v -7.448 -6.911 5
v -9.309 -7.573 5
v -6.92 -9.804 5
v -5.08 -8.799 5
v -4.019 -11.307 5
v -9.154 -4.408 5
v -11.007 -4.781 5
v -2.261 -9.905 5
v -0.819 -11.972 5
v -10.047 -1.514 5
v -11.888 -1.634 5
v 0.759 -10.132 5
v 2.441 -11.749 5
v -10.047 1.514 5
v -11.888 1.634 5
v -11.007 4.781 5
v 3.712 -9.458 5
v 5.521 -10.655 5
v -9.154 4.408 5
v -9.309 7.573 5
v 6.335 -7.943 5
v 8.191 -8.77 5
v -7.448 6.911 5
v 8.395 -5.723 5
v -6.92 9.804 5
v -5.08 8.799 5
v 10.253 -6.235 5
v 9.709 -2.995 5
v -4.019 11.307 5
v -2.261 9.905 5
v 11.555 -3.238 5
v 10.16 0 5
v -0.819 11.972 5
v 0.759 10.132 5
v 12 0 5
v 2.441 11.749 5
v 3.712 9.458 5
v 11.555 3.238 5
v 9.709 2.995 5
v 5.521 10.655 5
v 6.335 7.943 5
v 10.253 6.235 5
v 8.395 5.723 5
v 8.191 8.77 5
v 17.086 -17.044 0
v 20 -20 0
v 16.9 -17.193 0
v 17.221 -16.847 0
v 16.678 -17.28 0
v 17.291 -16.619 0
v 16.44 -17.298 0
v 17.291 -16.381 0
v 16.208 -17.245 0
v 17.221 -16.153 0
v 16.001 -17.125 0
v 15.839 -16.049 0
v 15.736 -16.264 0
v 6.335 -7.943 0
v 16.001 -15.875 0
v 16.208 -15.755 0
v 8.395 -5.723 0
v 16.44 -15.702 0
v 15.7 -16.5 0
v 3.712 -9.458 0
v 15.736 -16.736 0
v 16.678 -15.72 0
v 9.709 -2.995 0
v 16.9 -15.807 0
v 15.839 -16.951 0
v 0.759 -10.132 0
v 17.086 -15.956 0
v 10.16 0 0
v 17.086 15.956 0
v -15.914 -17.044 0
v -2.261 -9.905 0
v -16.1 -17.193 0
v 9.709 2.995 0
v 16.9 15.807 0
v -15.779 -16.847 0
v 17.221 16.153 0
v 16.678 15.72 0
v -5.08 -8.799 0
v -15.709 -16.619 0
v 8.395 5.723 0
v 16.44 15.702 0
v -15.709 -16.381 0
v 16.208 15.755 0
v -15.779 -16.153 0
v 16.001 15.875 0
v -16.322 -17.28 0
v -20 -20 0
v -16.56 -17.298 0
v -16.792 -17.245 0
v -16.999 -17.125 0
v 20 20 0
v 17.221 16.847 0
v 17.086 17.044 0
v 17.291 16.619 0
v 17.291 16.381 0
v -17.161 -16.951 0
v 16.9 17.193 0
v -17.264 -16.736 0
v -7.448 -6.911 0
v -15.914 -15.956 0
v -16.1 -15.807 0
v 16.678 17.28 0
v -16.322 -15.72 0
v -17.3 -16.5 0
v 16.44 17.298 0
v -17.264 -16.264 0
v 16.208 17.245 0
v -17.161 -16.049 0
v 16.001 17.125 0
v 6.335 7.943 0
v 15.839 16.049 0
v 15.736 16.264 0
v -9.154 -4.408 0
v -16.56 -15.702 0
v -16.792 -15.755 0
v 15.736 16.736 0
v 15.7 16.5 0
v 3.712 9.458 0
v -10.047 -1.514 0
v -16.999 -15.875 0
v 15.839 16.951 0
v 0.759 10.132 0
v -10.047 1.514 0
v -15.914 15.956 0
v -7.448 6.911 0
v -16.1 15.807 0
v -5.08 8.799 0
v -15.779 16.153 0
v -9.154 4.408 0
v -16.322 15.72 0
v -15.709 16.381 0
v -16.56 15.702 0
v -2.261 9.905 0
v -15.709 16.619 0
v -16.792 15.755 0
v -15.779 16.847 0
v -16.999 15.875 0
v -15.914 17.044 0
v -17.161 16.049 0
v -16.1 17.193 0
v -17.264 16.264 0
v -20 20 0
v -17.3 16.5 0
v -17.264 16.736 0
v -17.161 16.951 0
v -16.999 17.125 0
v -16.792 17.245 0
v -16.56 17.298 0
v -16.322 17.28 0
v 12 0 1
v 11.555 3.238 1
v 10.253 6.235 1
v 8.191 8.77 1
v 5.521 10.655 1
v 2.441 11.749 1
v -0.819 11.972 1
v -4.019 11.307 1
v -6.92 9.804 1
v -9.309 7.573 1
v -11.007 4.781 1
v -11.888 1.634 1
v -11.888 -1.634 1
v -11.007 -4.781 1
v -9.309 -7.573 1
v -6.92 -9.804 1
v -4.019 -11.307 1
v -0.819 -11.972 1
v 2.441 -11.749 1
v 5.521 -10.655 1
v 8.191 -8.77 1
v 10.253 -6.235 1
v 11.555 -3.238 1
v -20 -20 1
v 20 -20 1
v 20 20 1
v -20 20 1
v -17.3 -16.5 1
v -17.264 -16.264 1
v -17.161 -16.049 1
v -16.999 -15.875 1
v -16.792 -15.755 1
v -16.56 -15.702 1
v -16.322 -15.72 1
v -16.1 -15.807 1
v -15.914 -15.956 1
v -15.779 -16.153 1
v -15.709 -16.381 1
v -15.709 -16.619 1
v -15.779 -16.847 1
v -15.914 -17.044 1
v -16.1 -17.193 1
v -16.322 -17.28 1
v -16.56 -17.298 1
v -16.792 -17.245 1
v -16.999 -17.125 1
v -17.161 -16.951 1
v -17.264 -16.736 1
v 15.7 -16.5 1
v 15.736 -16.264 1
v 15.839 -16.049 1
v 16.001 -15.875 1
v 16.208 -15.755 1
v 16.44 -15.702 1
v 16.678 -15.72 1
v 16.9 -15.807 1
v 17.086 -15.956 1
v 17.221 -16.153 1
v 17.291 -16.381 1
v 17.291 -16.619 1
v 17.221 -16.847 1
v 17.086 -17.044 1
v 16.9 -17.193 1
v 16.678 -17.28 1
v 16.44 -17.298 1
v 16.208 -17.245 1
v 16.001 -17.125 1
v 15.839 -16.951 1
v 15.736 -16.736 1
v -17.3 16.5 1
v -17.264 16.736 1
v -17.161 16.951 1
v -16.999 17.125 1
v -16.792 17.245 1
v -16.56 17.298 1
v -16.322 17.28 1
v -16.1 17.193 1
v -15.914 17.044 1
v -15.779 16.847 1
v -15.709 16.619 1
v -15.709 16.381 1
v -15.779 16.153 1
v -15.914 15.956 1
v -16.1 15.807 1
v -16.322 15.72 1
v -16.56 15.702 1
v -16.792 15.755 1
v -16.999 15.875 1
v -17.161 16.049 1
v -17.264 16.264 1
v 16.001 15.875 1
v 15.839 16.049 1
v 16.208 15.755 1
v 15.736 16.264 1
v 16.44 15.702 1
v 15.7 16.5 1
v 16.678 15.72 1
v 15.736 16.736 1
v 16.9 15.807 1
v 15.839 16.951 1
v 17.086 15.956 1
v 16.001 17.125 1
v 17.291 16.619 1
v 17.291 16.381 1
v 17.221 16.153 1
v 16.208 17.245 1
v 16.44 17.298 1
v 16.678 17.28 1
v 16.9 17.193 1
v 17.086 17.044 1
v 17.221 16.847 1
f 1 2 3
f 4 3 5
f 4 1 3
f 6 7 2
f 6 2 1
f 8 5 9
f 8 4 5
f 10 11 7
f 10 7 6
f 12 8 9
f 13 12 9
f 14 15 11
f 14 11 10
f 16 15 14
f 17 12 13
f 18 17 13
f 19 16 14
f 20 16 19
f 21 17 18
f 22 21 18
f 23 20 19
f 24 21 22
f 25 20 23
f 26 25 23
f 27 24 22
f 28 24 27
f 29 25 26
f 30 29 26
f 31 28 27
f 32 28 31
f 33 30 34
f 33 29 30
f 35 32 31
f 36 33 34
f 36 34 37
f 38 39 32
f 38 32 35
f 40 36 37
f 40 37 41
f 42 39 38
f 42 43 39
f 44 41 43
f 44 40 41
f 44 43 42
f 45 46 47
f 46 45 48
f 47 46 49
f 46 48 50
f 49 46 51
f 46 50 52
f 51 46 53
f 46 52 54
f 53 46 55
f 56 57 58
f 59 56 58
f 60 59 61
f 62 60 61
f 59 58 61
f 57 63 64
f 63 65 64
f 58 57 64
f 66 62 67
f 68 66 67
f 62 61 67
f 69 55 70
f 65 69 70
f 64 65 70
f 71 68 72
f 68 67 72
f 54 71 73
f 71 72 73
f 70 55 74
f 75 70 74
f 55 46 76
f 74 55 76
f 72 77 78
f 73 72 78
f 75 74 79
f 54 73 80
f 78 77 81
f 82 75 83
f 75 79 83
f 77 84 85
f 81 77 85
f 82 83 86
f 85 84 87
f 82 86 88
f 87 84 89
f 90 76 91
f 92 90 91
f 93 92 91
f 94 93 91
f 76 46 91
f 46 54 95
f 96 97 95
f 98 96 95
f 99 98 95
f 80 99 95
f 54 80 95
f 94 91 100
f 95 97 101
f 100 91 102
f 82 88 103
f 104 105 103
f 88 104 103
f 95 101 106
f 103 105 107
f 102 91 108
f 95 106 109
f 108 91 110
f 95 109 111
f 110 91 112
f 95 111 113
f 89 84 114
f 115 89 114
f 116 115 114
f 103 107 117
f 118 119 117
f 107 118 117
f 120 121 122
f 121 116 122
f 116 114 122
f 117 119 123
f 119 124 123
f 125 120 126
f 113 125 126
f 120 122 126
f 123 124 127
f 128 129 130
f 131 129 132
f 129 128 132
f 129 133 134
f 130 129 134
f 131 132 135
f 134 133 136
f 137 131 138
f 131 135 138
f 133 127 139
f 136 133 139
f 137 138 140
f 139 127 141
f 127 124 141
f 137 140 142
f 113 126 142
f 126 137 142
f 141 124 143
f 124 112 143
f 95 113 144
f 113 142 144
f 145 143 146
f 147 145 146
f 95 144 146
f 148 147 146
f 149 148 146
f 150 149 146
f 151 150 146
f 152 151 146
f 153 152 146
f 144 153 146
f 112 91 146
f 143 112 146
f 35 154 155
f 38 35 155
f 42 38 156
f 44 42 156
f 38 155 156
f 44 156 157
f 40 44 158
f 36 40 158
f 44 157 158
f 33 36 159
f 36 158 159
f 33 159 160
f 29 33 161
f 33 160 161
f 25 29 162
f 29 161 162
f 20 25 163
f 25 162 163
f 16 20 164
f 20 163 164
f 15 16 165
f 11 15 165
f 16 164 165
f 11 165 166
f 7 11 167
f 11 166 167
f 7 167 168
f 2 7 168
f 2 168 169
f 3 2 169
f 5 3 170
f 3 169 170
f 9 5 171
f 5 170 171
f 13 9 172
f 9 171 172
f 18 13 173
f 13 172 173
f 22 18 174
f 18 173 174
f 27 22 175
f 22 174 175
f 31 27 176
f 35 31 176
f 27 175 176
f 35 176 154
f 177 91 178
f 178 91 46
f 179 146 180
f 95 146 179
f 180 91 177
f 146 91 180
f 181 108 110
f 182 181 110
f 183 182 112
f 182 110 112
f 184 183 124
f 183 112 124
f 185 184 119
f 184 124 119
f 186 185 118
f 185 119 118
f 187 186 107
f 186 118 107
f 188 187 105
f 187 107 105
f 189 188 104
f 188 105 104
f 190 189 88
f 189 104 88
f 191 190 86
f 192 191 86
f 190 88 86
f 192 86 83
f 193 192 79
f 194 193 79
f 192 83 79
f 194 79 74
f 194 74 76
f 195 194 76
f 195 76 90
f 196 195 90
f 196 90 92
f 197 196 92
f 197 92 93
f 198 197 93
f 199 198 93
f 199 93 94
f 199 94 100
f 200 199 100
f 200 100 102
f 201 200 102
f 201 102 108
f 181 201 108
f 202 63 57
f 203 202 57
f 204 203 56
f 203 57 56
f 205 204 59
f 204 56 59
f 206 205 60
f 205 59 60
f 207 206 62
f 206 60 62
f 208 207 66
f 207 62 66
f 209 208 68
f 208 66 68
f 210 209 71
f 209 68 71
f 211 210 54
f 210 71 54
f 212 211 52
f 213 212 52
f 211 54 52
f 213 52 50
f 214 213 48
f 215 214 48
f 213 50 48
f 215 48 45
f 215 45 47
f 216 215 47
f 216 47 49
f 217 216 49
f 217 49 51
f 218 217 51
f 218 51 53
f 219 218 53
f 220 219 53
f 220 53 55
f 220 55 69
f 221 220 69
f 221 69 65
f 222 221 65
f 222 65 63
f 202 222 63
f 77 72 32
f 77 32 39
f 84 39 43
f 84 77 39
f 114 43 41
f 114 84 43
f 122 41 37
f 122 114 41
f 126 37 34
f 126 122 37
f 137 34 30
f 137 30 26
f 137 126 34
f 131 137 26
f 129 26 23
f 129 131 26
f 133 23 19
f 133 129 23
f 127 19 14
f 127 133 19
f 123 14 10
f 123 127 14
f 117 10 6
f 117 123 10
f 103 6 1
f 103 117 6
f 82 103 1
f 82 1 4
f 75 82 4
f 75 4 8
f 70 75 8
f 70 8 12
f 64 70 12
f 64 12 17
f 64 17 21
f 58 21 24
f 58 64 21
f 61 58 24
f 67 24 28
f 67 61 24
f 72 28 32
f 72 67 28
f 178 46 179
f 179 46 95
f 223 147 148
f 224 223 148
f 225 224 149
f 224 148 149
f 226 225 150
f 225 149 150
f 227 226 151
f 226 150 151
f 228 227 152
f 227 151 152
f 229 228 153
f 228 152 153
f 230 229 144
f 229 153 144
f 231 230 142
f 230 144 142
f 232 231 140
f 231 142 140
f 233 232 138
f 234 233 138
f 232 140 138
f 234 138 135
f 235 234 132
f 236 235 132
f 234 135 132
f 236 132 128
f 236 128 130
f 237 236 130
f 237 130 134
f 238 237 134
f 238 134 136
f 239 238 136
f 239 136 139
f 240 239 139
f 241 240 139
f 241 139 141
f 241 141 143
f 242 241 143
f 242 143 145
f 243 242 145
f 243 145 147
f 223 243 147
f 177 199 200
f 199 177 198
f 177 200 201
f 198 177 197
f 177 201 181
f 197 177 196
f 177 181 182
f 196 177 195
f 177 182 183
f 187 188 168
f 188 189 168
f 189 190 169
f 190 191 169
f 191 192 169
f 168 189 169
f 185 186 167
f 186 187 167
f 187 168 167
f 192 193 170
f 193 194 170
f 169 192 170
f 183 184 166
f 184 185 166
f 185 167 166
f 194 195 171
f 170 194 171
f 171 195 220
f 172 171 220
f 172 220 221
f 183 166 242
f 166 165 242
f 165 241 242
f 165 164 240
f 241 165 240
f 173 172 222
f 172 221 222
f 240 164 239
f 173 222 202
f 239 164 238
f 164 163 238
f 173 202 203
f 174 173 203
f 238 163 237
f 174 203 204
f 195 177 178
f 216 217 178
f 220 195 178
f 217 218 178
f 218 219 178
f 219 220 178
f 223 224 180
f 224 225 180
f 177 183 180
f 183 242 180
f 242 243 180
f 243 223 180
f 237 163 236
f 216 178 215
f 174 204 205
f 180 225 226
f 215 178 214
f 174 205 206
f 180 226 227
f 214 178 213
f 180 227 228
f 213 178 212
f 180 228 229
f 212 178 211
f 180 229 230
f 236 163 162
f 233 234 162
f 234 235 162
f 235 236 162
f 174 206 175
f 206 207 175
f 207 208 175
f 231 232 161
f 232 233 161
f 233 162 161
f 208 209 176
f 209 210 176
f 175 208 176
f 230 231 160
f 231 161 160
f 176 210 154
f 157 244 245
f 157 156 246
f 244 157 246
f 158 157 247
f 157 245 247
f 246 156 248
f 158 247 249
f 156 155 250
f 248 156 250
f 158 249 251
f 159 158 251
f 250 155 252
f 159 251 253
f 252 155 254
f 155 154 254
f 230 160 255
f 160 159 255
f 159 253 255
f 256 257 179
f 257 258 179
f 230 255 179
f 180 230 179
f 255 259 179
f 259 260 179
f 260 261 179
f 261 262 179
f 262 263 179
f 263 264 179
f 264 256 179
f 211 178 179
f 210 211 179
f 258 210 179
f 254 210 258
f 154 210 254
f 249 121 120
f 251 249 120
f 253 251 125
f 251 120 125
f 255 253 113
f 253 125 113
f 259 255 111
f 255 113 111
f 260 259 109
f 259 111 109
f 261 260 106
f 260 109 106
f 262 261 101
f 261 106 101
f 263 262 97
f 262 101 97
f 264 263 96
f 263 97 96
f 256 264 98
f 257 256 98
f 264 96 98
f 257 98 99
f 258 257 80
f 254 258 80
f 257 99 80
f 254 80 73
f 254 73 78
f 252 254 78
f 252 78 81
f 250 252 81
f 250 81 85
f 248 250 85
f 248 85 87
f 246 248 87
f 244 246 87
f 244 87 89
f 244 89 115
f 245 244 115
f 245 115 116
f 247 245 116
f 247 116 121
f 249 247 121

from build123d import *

# Parameters (mm, degrees)
SKETCH1_R             = 14
SKETCH1_R_2           = 10.16
BOSS_EXTRUDE1_DEPTH   = 5
SKETCH1_3_W           = 40
SKETCH1_3_H           = 40
SKETCH1_3_R           = 14
BOSS_EXTRUDE2_DEPTH   = 1
CUT_EXTRUDE1_START    = -4
SKETCH2_R             = 14
SKETCH2_R_2           = 12
CUT_EXTRUDE1_DEPTH    = 4
SKETCH3_W             = 1
SKETCH3_H             = 40
BOSS_EXTRUDE3_DEPTH   = 50
BOSS_EXTRUDE5_DEPTH   = 50
SKETCH5_W             = 40
SKETCH5_H             = 50
CUT_EXTRUDE2_DEPTH    = 22
M2_TAPPED_HOLE2_D     = 1.6
M2_TAPPED_HOLE2_DEPTH = 6
M2_TAPPED_HOLE2_TIP   = 0.480688495


with BuildPart() as part:
    # Sketch1 → Boss-Extrude1 (new body)
    with BuildSketch(Plane(origin=(0, 0, 0), x_dir=(0, 1, 0), z_dir=(0, 0, 1))):
        with Locations(Location((0, 0, 0), (0, 0, 270))):
            Circle(SKETCH1_R)
        with Locations(Location((0, 0, 0), (0, 0, 270))):
            Circle(SKETCH1_R_2, mode=Mode.SUBTRACT)
    extrude(amount=BOSS_EXTRUDE1_DEPTH)

    # Sketch1<3> → Boss-Extrude2 (add)
    with BuildSketch(Plane(origin=(0, 0, 0), x_dir=(0, 1, 0), z_dir=(0, 0, 1))):
        Rectangle(SKETCH1_3_W, SKETCH1_3_H)
        with Locations(Location((0, 0, 0), (0, 0, 270))):
            Circle(SKETCH1_3_R, mode=Mode.SUBTRACT)
    extrude(amount=BOSS_EXTRUDE2_DEPTH)

    # Sketch2 → Cut-Extrude1 (cut)
    with BuildSketch(Plane.XY.offset(5).offset(CUT_EXTRUDE1_START)):
        Circle(SKETCH2_R)
        Circle(SKETCH2_R_2, mode=Mode.SUBTRACT)
    extrude(amount=CUT_EXTRUDE1_DEPTH, mode=Mode.SUBTRACT)

    # Sketch3 → Boss-Extrude3 (add)
    with BuildSketch(Plane.XY.offset(1)):
        with Locations((-19.5, 0)):
            Rectangle(SKETCH3_W, SKETCH3_H)
    extrude(amount=BOSS_EXTRUDE3_DEPTH)

    # Sketch4 → Boss-Extrude5 (add)
    with BuildSketch(Plane.XY.offset(51)):
        Polygon((-17, 5), (-19, 4), (-19, 0), (-19, -4), (-17, -5), align=None)
    extrude(amount=-BOSS_EXTRUDE5_DEPTH)

    # Sketch5 → Cut-Extrude2 (cut)
    with BuildSketch(Plane.YZ.offset(-17)):
        with Locations((0, 26)):
            Rectangle(SKETCH5_W, SKETCH5_H)
    extrude(amount=-CUT_EXTRUDE2_DEPTH, mode=Mode.SUBTRACT)

    # M2 Tapped Hole2
    with Locations(Plane.XY.offset(1)):
        with Locations((-16.5, -16.5), (-16.5, 16.5), (16.5, 16.5), (16.5, -16.5)):
            Hole(M2_TAPPED_HOLE2_D / 2, depth=M2_TAPPED_HOLE2_DEPTH)
            with Locations((0, 0, -(M2_TAPPED_HOLE2_DEPTH + M2_TAPPED_HOLE2_TIP / 2))):  # 118° drill point
                Cone(0, M2_TAPPED_HOLE2_D / 2, M2_TAPPED_HOLE2_TIP, mode=Mode.SUBTRACT)


solid = part.part
